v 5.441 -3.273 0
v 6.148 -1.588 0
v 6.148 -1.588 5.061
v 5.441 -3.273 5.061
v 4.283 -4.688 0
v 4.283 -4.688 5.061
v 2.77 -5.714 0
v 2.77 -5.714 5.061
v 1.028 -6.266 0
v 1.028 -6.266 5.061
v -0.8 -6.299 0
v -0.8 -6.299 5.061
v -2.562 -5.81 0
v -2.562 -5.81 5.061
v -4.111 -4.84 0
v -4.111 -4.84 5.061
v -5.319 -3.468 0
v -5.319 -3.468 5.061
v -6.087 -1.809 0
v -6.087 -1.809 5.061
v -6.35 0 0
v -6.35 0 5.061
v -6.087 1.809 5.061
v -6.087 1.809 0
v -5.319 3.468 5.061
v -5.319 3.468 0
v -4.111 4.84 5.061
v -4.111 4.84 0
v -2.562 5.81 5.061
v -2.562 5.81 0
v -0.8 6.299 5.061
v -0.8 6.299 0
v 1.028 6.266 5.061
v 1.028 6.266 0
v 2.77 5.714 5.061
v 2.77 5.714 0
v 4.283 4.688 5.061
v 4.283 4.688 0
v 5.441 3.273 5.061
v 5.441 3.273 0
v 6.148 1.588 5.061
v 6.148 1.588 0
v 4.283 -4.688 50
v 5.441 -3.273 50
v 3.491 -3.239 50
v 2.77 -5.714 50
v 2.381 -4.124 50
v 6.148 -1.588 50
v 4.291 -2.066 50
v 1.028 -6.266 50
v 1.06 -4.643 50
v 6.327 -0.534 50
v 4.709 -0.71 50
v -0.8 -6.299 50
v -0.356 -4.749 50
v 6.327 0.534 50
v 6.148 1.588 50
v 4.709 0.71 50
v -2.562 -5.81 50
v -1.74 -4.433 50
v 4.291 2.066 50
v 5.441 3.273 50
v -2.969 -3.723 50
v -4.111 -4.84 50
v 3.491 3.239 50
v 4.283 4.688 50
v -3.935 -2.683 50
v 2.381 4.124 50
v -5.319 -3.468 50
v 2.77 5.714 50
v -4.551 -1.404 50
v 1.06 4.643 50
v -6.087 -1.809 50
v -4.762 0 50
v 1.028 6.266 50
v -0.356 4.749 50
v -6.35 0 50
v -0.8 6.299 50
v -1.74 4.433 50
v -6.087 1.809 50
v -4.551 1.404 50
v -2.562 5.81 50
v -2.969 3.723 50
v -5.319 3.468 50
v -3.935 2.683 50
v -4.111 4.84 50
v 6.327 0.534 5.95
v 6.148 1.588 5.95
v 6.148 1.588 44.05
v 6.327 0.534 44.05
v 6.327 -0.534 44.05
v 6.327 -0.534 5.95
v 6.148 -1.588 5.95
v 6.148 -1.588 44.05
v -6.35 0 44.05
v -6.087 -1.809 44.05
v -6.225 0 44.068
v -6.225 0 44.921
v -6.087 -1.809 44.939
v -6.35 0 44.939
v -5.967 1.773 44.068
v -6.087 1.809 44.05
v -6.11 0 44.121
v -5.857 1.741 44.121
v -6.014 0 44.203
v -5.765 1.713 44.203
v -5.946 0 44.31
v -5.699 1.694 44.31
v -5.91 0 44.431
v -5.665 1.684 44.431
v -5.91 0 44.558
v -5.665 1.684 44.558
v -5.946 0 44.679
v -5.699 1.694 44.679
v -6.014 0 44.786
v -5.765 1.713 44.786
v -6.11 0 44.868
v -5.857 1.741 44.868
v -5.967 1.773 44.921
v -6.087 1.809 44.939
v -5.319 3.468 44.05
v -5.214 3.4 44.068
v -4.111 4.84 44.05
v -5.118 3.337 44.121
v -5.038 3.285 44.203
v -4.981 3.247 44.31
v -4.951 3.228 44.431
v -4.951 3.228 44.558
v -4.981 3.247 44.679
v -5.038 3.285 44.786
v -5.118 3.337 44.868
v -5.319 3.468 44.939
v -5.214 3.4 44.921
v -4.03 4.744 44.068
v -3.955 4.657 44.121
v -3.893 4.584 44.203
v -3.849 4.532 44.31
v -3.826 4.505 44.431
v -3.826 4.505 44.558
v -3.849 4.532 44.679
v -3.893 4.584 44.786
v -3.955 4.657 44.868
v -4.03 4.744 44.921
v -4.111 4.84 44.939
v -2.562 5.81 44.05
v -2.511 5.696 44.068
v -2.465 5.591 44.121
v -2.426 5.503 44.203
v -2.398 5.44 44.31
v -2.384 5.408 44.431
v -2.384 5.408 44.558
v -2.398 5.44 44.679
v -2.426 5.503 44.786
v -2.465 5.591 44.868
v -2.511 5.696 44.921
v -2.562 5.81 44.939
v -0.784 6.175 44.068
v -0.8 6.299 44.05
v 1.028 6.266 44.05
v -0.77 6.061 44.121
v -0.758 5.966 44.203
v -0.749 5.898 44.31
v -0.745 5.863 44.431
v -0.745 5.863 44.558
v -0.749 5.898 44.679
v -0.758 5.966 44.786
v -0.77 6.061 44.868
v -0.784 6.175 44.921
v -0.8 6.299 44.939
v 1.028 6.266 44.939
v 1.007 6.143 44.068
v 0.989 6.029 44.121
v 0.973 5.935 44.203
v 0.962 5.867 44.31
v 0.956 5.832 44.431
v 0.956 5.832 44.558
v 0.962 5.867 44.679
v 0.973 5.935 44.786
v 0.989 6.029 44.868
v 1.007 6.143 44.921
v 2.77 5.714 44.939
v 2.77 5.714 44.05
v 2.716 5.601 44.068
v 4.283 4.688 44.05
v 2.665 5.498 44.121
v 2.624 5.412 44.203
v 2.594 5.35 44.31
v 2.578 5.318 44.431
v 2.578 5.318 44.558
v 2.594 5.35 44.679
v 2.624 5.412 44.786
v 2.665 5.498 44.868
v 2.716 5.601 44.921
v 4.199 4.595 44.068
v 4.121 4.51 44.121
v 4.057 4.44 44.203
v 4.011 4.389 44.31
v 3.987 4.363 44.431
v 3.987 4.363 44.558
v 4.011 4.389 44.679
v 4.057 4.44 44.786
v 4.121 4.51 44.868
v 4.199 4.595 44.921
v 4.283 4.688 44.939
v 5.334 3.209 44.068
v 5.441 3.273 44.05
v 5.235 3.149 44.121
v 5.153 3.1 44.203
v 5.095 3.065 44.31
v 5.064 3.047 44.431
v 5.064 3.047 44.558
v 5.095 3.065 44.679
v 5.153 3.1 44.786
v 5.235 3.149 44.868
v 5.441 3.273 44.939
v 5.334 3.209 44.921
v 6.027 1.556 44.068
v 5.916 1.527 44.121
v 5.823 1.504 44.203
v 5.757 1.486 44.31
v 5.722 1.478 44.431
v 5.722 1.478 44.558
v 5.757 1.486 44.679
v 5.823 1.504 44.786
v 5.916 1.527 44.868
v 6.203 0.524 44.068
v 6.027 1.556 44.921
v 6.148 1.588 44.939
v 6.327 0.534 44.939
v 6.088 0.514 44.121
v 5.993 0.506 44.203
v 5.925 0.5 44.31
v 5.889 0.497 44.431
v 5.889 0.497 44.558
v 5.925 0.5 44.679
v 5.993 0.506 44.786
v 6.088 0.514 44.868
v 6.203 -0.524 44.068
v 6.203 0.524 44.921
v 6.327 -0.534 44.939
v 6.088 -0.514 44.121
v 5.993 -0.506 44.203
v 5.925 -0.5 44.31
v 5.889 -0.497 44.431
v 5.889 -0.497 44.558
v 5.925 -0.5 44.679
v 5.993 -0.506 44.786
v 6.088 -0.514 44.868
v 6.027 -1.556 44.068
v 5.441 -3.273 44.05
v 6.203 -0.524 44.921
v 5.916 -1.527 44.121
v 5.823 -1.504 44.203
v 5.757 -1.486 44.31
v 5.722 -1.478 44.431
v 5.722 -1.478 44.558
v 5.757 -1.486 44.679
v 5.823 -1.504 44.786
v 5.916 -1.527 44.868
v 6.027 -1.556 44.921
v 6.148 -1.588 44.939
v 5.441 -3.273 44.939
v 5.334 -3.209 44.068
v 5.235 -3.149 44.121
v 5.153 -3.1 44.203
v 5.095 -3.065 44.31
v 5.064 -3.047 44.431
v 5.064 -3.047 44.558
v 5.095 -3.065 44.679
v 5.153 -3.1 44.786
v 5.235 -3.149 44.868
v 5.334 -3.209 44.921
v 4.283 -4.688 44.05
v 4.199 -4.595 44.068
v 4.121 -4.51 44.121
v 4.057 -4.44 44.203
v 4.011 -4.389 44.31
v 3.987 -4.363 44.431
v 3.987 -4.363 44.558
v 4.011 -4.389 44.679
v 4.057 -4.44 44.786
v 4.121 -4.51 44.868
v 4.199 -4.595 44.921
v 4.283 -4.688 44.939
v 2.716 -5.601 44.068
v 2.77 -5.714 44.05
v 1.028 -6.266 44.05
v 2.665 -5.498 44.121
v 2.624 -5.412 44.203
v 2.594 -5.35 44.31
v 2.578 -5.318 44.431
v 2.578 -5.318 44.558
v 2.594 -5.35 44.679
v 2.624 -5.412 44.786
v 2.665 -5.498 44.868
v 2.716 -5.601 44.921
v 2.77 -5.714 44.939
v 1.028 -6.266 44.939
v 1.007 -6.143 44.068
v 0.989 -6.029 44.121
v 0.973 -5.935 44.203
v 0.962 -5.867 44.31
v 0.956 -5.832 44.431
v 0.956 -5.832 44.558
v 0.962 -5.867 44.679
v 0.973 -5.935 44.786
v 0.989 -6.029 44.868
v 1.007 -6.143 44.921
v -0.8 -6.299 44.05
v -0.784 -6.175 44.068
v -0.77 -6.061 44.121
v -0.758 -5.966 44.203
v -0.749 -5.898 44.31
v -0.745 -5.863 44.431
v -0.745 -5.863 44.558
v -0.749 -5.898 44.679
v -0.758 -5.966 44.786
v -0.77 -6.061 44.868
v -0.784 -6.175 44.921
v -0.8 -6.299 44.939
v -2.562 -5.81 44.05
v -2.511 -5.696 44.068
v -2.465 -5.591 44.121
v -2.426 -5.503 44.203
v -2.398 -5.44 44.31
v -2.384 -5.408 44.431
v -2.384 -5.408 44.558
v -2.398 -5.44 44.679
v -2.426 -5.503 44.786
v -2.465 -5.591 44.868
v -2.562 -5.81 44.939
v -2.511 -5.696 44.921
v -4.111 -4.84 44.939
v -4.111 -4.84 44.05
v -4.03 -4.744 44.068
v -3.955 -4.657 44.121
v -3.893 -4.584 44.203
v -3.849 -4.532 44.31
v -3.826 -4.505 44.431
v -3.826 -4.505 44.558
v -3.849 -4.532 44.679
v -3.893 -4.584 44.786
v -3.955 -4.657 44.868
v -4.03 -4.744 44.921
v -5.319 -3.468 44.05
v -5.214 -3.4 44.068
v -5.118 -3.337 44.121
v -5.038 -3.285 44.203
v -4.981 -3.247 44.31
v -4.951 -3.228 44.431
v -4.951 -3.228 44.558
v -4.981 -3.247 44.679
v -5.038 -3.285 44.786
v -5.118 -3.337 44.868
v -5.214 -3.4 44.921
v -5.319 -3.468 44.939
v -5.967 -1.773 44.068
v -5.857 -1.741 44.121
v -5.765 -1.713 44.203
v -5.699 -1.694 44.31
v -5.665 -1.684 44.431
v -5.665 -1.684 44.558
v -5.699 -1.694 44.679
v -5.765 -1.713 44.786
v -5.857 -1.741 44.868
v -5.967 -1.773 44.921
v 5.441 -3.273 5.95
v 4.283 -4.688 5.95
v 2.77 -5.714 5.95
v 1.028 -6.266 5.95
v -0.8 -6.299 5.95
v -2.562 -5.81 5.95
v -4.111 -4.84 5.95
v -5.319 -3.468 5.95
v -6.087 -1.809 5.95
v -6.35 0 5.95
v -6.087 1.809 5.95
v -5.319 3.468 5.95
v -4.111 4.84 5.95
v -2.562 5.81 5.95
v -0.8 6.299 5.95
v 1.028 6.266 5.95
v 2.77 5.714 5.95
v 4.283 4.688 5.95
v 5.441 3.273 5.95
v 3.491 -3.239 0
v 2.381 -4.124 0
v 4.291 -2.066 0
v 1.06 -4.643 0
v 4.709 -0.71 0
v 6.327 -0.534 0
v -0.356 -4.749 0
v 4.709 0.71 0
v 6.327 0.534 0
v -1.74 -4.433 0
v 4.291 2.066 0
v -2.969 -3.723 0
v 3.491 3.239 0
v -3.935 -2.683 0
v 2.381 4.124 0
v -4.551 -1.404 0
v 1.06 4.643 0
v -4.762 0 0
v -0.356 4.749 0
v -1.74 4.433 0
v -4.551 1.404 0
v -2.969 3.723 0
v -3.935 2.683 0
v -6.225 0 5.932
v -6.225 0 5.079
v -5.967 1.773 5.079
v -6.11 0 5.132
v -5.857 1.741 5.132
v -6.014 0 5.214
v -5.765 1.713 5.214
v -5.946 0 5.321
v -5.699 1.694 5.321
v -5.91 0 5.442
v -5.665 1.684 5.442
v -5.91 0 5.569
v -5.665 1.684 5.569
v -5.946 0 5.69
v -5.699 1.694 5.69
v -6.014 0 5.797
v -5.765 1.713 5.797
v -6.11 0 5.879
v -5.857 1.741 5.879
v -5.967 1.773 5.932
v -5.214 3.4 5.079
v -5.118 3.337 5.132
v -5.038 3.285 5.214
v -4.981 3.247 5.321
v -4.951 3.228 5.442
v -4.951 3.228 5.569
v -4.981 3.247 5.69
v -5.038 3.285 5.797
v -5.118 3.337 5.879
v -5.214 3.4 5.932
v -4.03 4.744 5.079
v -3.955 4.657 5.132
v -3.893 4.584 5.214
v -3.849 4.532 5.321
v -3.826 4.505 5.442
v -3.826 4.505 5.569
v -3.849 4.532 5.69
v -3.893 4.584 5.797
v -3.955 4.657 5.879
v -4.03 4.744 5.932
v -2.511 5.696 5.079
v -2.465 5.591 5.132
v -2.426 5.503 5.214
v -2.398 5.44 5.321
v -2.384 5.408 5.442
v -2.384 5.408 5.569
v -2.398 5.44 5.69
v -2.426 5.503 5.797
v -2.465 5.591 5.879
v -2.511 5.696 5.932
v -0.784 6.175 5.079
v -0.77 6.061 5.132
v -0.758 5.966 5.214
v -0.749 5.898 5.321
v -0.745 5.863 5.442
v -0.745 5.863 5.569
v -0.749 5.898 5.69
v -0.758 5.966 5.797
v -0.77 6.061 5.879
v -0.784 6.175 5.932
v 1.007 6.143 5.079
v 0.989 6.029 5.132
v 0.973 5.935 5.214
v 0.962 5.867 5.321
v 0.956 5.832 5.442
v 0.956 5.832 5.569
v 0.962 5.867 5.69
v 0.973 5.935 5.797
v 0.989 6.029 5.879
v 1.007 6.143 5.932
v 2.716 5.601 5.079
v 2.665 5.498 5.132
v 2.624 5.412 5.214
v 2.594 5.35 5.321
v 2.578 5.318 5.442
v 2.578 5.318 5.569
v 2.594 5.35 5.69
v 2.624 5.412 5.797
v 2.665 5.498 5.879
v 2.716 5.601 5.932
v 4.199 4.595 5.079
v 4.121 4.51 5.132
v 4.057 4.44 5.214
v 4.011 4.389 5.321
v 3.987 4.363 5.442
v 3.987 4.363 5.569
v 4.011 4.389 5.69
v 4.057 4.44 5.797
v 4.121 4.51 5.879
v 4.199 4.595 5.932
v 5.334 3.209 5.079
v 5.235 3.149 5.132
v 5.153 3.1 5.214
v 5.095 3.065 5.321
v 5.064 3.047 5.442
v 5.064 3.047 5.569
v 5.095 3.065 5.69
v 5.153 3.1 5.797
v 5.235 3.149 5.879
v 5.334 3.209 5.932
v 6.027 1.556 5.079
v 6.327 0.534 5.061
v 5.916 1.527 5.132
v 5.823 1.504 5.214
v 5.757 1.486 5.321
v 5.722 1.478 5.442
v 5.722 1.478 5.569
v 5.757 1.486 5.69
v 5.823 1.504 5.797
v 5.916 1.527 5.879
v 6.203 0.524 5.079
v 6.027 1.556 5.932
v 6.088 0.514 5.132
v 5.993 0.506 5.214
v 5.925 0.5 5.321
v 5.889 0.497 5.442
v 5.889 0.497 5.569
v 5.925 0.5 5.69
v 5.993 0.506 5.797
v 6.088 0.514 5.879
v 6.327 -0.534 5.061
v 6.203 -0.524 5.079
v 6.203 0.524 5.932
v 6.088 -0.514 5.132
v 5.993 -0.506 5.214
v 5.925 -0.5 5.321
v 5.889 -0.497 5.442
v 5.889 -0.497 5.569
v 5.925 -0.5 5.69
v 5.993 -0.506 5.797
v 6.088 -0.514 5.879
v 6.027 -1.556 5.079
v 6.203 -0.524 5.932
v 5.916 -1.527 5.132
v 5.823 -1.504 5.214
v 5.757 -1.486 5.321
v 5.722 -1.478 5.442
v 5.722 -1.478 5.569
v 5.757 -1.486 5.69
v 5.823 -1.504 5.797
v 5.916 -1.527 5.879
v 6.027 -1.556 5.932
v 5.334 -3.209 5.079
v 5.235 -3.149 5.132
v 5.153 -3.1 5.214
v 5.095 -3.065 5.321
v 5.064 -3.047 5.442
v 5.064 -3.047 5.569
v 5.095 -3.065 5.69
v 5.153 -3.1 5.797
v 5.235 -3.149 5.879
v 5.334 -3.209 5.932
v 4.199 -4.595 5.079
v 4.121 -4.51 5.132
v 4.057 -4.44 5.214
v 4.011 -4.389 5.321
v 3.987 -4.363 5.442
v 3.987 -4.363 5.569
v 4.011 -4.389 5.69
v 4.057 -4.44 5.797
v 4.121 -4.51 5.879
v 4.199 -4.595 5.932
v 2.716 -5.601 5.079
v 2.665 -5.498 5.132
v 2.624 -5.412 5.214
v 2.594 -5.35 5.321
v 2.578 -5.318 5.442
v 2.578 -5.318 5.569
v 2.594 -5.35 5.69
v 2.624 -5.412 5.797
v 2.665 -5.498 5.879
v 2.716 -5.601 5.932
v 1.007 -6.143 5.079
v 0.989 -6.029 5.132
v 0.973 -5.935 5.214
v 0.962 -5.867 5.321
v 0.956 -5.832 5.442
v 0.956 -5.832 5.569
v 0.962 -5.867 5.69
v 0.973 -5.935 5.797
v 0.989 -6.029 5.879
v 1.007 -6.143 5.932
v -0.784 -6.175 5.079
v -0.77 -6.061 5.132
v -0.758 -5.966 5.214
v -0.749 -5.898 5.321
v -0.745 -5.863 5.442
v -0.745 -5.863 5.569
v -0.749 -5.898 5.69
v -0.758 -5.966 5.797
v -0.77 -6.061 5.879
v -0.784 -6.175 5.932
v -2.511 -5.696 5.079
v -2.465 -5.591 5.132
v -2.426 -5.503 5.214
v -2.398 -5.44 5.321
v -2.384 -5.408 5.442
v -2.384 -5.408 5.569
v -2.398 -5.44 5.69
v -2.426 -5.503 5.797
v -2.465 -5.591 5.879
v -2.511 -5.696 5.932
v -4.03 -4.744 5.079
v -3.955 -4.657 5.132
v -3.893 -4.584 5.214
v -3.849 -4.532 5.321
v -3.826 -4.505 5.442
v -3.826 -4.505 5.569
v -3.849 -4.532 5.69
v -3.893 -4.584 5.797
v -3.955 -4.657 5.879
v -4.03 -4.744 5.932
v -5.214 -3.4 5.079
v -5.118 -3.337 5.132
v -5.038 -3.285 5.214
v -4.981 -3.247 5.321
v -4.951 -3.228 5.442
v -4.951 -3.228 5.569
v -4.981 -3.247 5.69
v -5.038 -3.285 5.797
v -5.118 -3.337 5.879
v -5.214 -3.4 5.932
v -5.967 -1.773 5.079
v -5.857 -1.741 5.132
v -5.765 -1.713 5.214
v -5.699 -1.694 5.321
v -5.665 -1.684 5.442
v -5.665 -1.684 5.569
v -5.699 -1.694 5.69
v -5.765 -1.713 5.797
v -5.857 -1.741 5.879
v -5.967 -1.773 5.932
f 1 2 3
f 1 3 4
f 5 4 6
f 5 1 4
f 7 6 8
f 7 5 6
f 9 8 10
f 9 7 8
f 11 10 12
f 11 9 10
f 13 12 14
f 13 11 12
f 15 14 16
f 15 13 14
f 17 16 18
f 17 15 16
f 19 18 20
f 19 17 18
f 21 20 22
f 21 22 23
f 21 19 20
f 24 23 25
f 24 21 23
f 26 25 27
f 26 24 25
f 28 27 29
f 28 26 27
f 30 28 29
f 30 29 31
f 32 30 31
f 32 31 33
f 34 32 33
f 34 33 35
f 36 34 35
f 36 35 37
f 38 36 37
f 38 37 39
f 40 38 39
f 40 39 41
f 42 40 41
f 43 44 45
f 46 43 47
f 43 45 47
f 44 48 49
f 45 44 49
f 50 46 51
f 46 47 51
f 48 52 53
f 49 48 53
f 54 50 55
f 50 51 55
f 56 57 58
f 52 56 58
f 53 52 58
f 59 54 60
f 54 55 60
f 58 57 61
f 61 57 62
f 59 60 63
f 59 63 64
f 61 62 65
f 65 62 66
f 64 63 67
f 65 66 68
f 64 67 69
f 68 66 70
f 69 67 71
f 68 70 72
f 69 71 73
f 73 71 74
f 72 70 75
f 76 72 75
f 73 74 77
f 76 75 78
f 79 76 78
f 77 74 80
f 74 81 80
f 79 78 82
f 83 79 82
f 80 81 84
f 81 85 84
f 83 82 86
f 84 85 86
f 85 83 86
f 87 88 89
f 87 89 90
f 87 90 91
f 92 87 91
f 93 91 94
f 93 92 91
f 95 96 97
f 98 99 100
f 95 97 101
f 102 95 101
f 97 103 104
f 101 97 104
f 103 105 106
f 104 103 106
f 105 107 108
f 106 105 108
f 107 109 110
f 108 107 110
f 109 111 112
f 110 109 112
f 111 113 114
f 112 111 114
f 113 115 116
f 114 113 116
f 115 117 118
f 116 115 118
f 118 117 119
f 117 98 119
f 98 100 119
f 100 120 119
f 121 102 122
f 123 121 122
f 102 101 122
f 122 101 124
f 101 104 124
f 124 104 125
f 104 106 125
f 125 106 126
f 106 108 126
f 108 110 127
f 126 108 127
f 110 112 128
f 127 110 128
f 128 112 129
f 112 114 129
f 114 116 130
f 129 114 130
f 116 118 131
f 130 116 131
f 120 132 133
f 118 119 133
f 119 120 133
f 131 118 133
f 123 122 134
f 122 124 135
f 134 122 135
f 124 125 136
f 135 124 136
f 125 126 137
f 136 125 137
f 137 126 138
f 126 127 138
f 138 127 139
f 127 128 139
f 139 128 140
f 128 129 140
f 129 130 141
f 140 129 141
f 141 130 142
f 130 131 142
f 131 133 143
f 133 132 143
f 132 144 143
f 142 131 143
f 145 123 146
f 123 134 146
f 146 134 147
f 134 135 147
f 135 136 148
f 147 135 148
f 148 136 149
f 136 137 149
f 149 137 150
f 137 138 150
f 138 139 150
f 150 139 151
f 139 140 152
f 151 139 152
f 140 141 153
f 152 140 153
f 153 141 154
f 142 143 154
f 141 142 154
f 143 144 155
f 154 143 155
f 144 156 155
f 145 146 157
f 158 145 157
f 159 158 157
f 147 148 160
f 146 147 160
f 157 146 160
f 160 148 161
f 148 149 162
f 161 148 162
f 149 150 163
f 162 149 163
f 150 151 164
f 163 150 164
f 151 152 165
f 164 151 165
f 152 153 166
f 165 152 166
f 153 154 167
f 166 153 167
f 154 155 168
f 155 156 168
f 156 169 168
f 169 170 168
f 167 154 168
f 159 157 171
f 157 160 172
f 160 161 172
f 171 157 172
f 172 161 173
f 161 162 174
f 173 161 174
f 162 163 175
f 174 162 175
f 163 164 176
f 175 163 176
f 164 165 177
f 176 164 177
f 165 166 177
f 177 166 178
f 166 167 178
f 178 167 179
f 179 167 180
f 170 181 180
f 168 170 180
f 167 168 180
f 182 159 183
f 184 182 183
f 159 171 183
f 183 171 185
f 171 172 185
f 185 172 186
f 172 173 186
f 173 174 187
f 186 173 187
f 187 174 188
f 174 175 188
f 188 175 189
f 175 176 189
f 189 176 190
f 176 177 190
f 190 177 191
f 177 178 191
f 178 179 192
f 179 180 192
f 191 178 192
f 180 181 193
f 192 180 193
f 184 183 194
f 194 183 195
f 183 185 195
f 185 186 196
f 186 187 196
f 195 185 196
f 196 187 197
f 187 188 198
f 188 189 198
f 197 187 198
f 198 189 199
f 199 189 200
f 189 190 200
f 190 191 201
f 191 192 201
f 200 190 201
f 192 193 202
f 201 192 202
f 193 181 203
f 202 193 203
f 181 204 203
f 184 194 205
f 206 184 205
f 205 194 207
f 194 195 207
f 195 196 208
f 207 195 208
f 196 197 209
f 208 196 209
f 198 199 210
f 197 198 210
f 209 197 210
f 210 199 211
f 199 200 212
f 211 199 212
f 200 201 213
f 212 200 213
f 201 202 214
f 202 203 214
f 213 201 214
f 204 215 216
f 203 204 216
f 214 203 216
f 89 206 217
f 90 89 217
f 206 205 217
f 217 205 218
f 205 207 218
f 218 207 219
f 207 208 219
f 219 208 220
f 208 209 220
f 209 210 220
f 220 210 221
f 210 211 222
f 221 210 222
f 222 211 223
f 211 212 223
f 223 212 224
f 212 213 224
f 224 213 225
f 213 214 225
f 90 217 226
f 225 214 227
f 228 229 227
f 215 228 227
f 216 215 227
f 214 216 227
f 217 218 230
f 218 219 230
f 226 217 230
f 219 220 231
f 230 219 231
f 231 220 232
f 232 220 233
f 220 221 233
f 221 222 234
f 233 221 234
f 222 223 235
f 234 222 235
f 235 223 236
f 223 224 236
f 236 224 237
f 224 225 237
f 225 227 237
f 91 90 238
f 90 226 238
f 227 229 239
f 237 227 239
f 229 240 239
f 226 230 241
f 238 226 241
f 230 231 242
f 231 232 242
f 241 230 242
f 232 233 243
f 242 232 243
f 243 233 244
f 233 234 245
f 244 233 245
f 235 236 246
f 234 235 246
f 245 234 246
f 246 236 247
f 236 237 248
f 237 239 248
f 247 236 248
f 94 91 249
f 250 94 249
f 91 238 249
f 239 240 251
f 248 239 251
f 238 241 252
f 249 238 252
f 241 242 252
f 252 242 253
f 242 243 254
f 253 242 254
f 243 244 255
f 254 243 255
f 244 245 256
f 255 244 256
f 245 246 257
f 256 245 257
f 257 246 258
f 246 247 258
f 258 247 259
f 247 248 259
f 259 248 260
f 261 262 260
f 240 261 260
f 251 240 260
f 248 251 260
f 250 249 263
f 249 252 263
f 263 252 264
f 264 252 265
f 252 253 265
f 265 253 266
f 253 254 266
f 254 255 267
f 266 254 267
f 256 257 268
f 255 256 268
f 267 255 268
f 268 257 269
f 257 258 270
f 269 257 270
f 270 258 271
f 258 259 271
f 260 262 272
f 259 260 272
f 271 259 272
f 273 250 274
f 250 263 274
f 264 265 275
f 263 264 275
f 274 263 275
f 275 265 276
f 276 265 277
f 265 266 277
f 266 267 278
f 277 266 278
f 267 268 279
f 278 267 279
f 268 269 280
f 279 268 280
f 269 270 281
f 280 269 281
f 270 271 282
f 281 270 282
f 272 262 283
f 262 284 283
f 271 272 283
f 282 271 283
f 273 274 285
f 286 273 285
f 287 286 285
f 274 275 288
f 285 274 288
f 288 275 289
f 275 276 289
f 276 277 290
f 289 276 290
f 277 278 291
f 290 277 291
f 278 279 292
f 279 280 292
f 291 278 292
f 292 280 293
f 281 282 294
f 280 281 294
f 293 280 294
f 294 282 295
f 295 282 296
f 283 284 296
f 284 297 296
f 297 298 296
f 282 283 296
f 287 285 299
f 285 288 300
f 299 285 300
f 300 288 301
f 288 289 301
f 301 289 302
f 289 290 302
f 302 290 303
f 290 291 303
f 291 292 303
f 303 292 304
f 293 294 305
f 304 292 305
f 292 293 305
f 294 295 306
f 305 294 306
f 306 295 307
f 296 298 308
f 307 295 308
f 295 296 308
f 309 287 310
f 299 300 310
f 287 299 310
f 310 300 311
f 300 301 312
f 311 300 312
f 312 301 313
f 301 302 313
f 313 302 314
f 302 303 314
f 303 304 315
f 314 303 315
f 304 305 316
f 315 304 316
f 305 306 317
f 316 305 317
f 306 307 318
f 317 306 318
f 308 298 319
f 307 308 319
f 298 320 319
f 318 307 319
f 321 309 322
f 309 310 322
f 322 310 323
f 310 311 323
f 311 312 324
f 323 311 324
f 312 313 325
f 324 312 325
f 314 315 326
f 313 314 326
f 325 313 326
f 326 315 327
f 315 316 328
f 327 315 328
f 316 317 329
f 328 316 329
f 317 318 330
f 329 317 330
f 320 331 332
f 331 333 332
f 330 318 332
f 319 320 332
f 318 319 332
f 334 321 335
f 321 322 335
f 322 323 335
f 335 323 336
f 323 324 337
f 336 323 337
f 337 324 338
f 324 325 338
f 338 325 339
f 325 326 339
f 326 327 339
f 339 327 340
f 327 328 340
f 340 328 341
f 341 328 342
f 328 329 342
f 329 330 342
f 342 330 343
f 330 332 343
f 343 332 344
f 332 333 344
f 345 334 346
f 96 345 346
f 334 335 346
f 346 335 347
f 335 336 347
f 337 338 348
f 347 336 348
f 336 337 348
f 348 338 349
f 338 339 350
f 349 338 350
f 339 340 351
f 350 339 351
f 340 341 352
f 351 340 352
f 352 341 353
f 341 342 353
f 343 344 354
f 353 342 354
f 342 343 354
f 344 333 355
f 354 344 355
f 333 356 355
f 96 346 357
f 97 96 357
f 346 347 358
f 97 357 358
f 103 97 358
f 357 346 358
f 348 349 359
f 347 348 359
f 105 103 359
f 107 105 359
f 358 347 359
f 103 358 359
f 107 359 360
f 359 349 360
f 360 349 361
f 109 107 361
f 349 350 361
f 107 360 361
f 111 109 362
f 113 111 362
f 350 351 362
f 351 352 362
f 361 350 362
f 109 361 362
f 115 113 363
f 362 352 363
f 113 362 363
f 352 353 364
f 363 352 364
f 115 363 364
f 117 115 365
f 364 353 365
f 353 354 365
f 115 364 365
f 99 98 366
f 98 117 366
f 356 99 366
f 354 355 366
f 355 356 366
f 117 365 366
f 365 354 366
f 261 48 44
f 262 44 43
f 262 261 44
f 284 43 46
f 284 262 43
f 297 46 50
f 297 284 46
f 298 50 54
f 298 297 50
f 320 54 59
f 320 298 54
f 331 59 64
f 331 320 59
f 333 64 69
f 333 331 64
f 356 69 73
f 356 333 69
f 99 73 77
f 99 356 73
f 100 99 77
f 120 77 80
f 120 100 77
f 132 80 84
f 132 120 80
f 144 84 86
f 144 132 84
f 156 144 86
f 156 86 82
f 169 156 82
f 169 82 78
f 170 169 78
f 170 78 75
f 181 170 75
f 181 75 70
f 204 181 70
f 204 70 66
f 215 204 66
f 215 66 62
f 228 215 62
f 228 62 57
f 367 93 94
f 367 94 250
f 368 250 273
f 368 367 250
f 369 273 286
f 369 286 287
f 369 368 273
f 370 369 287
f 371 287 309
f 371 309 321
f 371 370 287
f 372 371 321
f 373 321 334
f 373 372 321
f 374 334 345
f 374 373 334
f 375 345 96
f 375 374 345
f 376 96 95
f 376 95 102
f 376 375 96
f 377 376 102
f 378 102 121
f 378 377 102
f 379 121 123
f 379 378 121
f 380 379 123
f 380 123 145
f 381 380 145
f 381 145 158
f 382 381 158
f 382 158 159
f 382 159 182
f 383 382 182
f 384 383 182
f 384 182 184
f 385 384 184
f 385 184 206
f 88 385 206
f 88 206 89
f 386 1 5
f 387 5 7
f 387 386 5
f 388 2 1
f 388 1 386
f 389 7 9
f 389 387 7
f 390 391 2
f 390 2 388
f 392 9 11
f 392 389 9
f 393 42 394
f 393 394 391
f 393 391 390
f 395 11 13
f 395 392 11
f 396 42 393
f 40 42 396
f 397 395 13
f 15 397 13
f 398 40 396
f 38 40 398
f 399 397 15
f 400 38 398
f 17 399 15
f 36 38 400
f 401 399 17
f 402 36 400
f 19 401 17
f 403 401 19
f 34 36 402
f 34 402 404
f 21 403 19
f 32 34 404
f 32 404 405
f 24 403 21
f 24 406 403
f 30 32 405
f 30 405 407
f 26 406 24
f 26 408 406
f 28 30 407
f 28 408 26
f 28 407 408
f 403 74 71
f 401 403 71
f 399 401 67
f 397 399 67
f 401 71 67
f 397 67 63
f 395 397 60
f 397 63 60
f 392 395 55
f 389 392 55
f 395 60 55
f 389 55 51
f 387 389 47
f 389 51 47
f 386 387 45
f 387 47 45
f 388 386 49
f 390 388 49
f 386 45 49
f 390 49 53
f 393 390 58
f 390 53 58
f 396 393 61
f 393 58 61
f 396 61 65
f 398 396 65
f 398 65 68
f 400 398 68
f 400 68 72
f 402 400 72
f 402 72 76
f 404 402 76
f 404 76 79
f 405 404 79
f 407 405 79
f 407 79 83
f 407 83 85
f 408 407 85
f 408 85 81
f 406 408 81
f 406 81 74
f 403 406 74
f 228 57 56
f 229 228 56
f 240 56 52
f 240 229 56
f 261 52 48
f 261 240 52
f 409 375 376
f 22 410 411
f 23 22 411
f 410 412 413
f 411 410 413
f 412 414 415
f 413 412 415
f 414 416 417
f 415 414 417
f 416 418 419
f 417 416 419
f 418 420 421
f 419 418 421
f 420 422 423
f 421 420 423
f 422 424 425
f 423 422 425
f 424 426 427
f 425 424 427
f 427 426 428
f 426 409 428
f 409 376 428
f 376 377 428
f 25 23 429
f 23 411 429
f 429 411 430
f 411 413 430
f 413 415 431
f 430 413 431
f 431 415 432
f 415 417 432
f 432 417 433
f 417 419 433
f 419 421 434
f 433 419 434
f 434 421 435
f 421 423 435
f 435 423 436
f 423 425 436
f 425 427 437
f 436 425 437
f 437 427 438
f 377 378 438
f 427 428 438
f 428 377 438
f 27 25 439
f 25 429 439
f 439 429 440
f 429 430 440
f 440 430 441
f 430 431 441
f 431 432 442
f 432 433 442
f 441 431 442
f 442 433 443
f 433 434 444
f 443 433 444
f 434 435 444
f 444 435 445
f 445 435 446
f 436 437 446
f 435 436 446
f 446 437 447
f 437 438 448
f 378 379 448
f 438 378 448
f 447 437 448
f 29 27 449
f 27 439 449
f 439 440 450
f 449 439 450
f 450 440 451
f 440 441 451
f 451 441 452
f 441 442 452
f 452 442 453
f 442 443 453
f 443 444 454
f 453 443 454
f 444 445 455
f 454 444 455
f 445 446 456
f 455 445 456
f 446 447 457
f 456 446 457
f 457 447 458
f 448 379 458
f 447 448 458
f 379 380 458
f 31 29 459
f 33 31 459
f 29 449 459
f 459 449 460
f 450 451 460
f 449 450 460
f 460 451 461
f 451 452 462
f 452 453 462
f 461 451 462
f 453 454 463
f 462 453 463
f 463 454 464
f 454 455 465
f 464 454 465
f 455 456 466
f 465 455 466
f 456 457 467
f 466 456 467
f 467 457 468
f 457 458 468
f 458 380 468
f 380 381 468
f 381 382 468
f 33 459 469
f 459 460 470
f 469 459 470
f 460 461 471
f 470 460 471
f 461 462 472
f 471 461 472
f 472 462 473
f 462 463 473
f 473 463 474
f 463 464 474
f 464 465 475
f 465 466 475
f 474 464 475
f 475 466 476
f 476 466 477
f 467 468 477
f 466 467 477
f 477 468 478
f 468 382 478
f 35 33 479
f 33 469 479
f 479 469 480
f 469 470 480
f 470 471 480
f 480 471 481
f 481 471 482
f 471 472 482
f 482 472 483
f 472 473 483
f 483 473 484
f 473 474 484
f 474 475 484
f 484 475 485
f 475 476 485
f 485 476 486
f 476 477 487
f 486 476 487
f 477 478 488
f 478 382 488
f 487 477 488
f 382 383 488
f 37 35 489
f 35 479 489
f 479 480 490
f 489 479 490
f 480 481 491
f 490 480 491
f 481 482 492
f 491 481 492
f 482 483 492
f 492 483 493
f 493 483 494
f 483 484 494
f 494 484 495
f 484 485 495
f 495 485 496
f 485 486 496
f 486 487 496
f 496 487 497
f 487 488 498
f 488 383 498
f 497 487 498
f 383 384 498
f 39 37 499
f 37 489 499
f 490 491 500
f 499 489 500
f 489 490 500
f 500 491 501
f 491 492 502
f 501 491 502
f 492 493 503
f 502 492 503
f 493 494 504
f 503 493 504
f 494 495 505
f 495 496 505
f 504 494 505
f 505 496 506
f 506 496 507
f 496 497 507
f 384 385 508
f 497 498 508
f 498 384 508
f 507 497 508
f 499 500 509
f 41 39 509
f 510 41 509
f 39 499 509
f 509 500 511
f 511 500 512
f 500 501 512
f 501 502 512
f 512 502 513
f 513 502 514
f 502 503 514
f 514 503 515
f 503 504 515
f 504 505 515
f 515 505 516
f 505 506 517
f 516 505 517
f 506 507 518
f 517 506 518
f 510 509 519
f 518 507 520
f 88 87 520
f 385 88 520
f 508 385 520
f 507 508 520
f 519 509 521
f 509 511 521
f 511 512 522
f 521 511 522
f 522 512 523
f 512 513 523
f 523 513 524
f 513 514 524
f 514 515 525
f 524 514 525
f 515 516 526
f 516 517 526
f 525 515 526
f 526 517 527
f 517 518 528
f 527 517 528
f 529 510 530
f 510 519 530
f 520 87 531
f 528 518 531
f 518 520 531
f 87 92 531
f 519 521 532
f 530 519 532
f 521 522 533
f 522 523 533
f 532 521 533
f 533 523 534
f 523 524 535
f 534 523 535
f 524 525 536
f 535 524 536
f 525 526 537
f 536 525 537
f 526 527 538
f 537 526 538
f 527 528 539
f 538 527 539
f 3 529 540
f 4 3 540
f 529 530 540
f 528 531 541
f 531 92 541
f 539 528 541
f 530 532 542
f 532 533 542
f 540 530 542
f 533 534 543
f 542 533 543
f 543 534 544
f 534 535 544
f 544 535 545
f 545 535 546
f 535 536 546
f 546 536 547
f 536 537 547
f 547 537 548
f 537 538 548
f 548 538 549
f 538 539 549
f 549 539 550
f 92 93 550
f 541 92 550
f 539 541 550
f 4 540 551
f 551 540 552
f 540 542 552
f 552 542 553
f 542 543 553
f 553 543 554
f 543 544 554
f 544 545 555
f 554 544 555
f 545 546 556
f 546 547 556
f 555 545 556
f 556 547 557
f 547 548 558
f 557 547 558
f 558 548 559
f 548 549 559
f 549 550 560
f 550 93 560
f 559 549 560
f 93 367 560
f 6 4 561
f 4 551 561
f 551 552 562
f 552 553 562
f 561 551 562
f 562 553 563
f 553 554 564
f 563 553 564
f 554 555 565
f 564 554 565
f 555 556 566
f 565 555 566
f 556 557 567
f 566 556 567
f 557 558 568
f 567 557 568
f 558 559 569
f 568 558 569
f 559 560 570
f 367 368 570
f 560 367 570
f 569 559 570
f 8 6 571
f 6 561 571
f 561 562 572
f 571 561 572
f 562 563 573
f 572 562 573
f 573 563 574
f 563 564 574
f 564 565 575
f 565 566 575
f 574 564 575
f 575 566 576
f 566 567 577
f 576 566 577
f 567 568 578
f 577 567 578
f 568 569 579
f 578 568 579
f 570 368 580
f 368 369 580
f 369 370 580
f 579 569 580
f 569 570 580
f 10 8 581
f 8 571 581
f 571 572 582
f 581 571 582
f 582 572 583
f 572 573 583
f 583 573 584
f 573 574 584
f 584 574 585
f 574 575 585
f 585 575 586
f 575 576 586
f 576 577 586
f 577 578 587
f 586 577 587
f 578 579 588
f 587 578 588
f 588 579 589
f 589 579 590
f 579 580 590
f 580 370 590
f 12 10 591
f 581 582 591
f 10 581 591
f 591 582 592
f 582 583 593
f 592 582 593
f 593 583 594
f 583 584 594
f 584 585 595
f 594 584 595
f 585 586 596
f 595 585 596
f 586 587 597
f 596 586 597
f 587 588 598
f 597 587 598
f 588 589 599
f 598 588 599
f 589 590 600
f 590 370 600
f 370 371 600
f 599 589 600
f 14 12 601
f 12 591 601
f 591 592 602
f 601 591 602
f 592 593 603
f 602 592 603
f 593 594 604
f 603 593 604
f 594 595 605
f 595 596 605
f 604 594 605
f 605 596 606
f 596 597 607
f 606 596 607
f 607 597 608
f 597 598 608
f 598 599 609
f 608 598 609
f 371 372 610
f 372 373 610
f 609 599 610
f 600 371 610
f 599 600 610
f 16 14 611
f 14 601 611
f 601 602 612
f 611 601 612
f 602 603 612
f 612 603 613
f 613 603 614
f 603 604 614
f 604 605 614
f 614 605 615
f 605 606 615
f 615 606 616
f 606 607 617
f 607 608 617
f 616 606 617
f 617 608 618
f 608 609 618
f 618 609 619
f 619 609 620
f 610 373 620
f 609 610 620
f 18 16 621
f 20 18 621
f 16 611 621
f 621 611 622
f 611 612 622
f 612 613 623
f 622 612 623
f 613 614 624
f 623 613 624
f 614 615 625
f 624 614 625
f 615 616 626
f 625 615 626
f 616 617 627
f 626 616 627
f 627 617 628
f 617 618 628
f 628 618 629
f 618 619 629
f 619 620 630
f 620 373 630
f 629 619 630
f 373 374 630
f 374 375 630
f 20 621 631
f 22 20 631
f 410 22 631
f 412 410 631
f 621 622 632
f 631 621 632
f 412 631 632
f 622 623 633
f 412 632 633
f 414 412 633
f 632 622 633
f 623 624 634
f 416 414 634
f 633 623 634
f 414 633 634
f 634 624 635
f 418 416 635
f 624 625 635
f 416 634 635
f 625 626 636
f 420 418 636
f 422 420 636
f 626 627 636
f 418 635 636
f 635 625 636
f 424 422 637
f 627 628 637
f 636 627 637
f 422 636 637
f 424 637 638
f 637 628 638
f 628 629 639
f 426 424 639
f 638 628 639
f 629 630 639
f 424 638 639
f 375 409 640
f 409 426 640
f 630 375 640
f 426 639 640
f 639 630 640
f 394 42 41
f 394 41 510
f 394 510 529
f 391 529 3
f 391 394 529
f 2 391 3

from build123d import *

# Parameters (mm, degrees)
BOSS_EXTRUDE1_DEPTH        = 50
F_3_8_0_3750_DOWEL_HOLE1_D = 9.525


with BuildPart() as part:
    # Sketch1 → Boss-Extrude1 (new body)
    with BuildSketch(Plane.XY):
        with BuildLine():
            Line((6.148361062, 1.5875), (3.862361062, 1.5875))
            Line((3.862361062, 1.5875), (3.862361062, -1.5875))
            Line((3.862361062, -1.5875), (6.148361062, -1.5875))
            ThreePointArc((6.148361062, -1.5875), (-6.35, 0), (6.148361062, 1.5875))
        make_face()
        with BuildLine():
            ThreePointArc((6.148361062, 1.5875), (6.35, 0), (6.148361062, -1.5875))
            Line((6.148361062, -1.5875), (3.862361062, -1.5875))
            Line((3.862361062, -1.5875), (3.862361062, 1.5875))
            Line((3.862361062, 1.5875), (6.148361062, 1.5875))
        make_face()
    extrude(amount=BOSS_EXTRUDE1_DEPTH)

    # 3/8 (0.3750) Dowel Hole1 (through all)
    with Locations(Plane(origin=(0, 0, 0), x_dir=(1, 0, 0), z_dir=(0, 0, -1))):
        with Locations((0, 0)):
            Hole(F_3_8_0_3750_DOWEL_HOLE1_D / 2)

    # Sketch5 → Cut-Revolve1 (revolve, cut)
    with BuildSketch(Plane(origin=(0, 0, 0), x_dir=(1, 0, 0), z_dir=(0, 1, 0))):
        with BuildLine():
            ThreePointArc((-6.35, -44.05), (-5.9055, -44.4945), (-6.35, -44.939))
            Line((-6.35, -44.939), (-6.35, -44.05))
        make_face()
        with BuildLine():
            Line((-6.35, -5.95), (-6.35, -5.061))
            ThreePointArc((-6.35, -5.061), (-5.9055, -5.5055), (-6.35, -5.95))
        make_face()
    revolve(axis=Axis((0, 0, 50), (0, 0, -1)), mode=Mode.SUBTRACT)


solid = part.part
